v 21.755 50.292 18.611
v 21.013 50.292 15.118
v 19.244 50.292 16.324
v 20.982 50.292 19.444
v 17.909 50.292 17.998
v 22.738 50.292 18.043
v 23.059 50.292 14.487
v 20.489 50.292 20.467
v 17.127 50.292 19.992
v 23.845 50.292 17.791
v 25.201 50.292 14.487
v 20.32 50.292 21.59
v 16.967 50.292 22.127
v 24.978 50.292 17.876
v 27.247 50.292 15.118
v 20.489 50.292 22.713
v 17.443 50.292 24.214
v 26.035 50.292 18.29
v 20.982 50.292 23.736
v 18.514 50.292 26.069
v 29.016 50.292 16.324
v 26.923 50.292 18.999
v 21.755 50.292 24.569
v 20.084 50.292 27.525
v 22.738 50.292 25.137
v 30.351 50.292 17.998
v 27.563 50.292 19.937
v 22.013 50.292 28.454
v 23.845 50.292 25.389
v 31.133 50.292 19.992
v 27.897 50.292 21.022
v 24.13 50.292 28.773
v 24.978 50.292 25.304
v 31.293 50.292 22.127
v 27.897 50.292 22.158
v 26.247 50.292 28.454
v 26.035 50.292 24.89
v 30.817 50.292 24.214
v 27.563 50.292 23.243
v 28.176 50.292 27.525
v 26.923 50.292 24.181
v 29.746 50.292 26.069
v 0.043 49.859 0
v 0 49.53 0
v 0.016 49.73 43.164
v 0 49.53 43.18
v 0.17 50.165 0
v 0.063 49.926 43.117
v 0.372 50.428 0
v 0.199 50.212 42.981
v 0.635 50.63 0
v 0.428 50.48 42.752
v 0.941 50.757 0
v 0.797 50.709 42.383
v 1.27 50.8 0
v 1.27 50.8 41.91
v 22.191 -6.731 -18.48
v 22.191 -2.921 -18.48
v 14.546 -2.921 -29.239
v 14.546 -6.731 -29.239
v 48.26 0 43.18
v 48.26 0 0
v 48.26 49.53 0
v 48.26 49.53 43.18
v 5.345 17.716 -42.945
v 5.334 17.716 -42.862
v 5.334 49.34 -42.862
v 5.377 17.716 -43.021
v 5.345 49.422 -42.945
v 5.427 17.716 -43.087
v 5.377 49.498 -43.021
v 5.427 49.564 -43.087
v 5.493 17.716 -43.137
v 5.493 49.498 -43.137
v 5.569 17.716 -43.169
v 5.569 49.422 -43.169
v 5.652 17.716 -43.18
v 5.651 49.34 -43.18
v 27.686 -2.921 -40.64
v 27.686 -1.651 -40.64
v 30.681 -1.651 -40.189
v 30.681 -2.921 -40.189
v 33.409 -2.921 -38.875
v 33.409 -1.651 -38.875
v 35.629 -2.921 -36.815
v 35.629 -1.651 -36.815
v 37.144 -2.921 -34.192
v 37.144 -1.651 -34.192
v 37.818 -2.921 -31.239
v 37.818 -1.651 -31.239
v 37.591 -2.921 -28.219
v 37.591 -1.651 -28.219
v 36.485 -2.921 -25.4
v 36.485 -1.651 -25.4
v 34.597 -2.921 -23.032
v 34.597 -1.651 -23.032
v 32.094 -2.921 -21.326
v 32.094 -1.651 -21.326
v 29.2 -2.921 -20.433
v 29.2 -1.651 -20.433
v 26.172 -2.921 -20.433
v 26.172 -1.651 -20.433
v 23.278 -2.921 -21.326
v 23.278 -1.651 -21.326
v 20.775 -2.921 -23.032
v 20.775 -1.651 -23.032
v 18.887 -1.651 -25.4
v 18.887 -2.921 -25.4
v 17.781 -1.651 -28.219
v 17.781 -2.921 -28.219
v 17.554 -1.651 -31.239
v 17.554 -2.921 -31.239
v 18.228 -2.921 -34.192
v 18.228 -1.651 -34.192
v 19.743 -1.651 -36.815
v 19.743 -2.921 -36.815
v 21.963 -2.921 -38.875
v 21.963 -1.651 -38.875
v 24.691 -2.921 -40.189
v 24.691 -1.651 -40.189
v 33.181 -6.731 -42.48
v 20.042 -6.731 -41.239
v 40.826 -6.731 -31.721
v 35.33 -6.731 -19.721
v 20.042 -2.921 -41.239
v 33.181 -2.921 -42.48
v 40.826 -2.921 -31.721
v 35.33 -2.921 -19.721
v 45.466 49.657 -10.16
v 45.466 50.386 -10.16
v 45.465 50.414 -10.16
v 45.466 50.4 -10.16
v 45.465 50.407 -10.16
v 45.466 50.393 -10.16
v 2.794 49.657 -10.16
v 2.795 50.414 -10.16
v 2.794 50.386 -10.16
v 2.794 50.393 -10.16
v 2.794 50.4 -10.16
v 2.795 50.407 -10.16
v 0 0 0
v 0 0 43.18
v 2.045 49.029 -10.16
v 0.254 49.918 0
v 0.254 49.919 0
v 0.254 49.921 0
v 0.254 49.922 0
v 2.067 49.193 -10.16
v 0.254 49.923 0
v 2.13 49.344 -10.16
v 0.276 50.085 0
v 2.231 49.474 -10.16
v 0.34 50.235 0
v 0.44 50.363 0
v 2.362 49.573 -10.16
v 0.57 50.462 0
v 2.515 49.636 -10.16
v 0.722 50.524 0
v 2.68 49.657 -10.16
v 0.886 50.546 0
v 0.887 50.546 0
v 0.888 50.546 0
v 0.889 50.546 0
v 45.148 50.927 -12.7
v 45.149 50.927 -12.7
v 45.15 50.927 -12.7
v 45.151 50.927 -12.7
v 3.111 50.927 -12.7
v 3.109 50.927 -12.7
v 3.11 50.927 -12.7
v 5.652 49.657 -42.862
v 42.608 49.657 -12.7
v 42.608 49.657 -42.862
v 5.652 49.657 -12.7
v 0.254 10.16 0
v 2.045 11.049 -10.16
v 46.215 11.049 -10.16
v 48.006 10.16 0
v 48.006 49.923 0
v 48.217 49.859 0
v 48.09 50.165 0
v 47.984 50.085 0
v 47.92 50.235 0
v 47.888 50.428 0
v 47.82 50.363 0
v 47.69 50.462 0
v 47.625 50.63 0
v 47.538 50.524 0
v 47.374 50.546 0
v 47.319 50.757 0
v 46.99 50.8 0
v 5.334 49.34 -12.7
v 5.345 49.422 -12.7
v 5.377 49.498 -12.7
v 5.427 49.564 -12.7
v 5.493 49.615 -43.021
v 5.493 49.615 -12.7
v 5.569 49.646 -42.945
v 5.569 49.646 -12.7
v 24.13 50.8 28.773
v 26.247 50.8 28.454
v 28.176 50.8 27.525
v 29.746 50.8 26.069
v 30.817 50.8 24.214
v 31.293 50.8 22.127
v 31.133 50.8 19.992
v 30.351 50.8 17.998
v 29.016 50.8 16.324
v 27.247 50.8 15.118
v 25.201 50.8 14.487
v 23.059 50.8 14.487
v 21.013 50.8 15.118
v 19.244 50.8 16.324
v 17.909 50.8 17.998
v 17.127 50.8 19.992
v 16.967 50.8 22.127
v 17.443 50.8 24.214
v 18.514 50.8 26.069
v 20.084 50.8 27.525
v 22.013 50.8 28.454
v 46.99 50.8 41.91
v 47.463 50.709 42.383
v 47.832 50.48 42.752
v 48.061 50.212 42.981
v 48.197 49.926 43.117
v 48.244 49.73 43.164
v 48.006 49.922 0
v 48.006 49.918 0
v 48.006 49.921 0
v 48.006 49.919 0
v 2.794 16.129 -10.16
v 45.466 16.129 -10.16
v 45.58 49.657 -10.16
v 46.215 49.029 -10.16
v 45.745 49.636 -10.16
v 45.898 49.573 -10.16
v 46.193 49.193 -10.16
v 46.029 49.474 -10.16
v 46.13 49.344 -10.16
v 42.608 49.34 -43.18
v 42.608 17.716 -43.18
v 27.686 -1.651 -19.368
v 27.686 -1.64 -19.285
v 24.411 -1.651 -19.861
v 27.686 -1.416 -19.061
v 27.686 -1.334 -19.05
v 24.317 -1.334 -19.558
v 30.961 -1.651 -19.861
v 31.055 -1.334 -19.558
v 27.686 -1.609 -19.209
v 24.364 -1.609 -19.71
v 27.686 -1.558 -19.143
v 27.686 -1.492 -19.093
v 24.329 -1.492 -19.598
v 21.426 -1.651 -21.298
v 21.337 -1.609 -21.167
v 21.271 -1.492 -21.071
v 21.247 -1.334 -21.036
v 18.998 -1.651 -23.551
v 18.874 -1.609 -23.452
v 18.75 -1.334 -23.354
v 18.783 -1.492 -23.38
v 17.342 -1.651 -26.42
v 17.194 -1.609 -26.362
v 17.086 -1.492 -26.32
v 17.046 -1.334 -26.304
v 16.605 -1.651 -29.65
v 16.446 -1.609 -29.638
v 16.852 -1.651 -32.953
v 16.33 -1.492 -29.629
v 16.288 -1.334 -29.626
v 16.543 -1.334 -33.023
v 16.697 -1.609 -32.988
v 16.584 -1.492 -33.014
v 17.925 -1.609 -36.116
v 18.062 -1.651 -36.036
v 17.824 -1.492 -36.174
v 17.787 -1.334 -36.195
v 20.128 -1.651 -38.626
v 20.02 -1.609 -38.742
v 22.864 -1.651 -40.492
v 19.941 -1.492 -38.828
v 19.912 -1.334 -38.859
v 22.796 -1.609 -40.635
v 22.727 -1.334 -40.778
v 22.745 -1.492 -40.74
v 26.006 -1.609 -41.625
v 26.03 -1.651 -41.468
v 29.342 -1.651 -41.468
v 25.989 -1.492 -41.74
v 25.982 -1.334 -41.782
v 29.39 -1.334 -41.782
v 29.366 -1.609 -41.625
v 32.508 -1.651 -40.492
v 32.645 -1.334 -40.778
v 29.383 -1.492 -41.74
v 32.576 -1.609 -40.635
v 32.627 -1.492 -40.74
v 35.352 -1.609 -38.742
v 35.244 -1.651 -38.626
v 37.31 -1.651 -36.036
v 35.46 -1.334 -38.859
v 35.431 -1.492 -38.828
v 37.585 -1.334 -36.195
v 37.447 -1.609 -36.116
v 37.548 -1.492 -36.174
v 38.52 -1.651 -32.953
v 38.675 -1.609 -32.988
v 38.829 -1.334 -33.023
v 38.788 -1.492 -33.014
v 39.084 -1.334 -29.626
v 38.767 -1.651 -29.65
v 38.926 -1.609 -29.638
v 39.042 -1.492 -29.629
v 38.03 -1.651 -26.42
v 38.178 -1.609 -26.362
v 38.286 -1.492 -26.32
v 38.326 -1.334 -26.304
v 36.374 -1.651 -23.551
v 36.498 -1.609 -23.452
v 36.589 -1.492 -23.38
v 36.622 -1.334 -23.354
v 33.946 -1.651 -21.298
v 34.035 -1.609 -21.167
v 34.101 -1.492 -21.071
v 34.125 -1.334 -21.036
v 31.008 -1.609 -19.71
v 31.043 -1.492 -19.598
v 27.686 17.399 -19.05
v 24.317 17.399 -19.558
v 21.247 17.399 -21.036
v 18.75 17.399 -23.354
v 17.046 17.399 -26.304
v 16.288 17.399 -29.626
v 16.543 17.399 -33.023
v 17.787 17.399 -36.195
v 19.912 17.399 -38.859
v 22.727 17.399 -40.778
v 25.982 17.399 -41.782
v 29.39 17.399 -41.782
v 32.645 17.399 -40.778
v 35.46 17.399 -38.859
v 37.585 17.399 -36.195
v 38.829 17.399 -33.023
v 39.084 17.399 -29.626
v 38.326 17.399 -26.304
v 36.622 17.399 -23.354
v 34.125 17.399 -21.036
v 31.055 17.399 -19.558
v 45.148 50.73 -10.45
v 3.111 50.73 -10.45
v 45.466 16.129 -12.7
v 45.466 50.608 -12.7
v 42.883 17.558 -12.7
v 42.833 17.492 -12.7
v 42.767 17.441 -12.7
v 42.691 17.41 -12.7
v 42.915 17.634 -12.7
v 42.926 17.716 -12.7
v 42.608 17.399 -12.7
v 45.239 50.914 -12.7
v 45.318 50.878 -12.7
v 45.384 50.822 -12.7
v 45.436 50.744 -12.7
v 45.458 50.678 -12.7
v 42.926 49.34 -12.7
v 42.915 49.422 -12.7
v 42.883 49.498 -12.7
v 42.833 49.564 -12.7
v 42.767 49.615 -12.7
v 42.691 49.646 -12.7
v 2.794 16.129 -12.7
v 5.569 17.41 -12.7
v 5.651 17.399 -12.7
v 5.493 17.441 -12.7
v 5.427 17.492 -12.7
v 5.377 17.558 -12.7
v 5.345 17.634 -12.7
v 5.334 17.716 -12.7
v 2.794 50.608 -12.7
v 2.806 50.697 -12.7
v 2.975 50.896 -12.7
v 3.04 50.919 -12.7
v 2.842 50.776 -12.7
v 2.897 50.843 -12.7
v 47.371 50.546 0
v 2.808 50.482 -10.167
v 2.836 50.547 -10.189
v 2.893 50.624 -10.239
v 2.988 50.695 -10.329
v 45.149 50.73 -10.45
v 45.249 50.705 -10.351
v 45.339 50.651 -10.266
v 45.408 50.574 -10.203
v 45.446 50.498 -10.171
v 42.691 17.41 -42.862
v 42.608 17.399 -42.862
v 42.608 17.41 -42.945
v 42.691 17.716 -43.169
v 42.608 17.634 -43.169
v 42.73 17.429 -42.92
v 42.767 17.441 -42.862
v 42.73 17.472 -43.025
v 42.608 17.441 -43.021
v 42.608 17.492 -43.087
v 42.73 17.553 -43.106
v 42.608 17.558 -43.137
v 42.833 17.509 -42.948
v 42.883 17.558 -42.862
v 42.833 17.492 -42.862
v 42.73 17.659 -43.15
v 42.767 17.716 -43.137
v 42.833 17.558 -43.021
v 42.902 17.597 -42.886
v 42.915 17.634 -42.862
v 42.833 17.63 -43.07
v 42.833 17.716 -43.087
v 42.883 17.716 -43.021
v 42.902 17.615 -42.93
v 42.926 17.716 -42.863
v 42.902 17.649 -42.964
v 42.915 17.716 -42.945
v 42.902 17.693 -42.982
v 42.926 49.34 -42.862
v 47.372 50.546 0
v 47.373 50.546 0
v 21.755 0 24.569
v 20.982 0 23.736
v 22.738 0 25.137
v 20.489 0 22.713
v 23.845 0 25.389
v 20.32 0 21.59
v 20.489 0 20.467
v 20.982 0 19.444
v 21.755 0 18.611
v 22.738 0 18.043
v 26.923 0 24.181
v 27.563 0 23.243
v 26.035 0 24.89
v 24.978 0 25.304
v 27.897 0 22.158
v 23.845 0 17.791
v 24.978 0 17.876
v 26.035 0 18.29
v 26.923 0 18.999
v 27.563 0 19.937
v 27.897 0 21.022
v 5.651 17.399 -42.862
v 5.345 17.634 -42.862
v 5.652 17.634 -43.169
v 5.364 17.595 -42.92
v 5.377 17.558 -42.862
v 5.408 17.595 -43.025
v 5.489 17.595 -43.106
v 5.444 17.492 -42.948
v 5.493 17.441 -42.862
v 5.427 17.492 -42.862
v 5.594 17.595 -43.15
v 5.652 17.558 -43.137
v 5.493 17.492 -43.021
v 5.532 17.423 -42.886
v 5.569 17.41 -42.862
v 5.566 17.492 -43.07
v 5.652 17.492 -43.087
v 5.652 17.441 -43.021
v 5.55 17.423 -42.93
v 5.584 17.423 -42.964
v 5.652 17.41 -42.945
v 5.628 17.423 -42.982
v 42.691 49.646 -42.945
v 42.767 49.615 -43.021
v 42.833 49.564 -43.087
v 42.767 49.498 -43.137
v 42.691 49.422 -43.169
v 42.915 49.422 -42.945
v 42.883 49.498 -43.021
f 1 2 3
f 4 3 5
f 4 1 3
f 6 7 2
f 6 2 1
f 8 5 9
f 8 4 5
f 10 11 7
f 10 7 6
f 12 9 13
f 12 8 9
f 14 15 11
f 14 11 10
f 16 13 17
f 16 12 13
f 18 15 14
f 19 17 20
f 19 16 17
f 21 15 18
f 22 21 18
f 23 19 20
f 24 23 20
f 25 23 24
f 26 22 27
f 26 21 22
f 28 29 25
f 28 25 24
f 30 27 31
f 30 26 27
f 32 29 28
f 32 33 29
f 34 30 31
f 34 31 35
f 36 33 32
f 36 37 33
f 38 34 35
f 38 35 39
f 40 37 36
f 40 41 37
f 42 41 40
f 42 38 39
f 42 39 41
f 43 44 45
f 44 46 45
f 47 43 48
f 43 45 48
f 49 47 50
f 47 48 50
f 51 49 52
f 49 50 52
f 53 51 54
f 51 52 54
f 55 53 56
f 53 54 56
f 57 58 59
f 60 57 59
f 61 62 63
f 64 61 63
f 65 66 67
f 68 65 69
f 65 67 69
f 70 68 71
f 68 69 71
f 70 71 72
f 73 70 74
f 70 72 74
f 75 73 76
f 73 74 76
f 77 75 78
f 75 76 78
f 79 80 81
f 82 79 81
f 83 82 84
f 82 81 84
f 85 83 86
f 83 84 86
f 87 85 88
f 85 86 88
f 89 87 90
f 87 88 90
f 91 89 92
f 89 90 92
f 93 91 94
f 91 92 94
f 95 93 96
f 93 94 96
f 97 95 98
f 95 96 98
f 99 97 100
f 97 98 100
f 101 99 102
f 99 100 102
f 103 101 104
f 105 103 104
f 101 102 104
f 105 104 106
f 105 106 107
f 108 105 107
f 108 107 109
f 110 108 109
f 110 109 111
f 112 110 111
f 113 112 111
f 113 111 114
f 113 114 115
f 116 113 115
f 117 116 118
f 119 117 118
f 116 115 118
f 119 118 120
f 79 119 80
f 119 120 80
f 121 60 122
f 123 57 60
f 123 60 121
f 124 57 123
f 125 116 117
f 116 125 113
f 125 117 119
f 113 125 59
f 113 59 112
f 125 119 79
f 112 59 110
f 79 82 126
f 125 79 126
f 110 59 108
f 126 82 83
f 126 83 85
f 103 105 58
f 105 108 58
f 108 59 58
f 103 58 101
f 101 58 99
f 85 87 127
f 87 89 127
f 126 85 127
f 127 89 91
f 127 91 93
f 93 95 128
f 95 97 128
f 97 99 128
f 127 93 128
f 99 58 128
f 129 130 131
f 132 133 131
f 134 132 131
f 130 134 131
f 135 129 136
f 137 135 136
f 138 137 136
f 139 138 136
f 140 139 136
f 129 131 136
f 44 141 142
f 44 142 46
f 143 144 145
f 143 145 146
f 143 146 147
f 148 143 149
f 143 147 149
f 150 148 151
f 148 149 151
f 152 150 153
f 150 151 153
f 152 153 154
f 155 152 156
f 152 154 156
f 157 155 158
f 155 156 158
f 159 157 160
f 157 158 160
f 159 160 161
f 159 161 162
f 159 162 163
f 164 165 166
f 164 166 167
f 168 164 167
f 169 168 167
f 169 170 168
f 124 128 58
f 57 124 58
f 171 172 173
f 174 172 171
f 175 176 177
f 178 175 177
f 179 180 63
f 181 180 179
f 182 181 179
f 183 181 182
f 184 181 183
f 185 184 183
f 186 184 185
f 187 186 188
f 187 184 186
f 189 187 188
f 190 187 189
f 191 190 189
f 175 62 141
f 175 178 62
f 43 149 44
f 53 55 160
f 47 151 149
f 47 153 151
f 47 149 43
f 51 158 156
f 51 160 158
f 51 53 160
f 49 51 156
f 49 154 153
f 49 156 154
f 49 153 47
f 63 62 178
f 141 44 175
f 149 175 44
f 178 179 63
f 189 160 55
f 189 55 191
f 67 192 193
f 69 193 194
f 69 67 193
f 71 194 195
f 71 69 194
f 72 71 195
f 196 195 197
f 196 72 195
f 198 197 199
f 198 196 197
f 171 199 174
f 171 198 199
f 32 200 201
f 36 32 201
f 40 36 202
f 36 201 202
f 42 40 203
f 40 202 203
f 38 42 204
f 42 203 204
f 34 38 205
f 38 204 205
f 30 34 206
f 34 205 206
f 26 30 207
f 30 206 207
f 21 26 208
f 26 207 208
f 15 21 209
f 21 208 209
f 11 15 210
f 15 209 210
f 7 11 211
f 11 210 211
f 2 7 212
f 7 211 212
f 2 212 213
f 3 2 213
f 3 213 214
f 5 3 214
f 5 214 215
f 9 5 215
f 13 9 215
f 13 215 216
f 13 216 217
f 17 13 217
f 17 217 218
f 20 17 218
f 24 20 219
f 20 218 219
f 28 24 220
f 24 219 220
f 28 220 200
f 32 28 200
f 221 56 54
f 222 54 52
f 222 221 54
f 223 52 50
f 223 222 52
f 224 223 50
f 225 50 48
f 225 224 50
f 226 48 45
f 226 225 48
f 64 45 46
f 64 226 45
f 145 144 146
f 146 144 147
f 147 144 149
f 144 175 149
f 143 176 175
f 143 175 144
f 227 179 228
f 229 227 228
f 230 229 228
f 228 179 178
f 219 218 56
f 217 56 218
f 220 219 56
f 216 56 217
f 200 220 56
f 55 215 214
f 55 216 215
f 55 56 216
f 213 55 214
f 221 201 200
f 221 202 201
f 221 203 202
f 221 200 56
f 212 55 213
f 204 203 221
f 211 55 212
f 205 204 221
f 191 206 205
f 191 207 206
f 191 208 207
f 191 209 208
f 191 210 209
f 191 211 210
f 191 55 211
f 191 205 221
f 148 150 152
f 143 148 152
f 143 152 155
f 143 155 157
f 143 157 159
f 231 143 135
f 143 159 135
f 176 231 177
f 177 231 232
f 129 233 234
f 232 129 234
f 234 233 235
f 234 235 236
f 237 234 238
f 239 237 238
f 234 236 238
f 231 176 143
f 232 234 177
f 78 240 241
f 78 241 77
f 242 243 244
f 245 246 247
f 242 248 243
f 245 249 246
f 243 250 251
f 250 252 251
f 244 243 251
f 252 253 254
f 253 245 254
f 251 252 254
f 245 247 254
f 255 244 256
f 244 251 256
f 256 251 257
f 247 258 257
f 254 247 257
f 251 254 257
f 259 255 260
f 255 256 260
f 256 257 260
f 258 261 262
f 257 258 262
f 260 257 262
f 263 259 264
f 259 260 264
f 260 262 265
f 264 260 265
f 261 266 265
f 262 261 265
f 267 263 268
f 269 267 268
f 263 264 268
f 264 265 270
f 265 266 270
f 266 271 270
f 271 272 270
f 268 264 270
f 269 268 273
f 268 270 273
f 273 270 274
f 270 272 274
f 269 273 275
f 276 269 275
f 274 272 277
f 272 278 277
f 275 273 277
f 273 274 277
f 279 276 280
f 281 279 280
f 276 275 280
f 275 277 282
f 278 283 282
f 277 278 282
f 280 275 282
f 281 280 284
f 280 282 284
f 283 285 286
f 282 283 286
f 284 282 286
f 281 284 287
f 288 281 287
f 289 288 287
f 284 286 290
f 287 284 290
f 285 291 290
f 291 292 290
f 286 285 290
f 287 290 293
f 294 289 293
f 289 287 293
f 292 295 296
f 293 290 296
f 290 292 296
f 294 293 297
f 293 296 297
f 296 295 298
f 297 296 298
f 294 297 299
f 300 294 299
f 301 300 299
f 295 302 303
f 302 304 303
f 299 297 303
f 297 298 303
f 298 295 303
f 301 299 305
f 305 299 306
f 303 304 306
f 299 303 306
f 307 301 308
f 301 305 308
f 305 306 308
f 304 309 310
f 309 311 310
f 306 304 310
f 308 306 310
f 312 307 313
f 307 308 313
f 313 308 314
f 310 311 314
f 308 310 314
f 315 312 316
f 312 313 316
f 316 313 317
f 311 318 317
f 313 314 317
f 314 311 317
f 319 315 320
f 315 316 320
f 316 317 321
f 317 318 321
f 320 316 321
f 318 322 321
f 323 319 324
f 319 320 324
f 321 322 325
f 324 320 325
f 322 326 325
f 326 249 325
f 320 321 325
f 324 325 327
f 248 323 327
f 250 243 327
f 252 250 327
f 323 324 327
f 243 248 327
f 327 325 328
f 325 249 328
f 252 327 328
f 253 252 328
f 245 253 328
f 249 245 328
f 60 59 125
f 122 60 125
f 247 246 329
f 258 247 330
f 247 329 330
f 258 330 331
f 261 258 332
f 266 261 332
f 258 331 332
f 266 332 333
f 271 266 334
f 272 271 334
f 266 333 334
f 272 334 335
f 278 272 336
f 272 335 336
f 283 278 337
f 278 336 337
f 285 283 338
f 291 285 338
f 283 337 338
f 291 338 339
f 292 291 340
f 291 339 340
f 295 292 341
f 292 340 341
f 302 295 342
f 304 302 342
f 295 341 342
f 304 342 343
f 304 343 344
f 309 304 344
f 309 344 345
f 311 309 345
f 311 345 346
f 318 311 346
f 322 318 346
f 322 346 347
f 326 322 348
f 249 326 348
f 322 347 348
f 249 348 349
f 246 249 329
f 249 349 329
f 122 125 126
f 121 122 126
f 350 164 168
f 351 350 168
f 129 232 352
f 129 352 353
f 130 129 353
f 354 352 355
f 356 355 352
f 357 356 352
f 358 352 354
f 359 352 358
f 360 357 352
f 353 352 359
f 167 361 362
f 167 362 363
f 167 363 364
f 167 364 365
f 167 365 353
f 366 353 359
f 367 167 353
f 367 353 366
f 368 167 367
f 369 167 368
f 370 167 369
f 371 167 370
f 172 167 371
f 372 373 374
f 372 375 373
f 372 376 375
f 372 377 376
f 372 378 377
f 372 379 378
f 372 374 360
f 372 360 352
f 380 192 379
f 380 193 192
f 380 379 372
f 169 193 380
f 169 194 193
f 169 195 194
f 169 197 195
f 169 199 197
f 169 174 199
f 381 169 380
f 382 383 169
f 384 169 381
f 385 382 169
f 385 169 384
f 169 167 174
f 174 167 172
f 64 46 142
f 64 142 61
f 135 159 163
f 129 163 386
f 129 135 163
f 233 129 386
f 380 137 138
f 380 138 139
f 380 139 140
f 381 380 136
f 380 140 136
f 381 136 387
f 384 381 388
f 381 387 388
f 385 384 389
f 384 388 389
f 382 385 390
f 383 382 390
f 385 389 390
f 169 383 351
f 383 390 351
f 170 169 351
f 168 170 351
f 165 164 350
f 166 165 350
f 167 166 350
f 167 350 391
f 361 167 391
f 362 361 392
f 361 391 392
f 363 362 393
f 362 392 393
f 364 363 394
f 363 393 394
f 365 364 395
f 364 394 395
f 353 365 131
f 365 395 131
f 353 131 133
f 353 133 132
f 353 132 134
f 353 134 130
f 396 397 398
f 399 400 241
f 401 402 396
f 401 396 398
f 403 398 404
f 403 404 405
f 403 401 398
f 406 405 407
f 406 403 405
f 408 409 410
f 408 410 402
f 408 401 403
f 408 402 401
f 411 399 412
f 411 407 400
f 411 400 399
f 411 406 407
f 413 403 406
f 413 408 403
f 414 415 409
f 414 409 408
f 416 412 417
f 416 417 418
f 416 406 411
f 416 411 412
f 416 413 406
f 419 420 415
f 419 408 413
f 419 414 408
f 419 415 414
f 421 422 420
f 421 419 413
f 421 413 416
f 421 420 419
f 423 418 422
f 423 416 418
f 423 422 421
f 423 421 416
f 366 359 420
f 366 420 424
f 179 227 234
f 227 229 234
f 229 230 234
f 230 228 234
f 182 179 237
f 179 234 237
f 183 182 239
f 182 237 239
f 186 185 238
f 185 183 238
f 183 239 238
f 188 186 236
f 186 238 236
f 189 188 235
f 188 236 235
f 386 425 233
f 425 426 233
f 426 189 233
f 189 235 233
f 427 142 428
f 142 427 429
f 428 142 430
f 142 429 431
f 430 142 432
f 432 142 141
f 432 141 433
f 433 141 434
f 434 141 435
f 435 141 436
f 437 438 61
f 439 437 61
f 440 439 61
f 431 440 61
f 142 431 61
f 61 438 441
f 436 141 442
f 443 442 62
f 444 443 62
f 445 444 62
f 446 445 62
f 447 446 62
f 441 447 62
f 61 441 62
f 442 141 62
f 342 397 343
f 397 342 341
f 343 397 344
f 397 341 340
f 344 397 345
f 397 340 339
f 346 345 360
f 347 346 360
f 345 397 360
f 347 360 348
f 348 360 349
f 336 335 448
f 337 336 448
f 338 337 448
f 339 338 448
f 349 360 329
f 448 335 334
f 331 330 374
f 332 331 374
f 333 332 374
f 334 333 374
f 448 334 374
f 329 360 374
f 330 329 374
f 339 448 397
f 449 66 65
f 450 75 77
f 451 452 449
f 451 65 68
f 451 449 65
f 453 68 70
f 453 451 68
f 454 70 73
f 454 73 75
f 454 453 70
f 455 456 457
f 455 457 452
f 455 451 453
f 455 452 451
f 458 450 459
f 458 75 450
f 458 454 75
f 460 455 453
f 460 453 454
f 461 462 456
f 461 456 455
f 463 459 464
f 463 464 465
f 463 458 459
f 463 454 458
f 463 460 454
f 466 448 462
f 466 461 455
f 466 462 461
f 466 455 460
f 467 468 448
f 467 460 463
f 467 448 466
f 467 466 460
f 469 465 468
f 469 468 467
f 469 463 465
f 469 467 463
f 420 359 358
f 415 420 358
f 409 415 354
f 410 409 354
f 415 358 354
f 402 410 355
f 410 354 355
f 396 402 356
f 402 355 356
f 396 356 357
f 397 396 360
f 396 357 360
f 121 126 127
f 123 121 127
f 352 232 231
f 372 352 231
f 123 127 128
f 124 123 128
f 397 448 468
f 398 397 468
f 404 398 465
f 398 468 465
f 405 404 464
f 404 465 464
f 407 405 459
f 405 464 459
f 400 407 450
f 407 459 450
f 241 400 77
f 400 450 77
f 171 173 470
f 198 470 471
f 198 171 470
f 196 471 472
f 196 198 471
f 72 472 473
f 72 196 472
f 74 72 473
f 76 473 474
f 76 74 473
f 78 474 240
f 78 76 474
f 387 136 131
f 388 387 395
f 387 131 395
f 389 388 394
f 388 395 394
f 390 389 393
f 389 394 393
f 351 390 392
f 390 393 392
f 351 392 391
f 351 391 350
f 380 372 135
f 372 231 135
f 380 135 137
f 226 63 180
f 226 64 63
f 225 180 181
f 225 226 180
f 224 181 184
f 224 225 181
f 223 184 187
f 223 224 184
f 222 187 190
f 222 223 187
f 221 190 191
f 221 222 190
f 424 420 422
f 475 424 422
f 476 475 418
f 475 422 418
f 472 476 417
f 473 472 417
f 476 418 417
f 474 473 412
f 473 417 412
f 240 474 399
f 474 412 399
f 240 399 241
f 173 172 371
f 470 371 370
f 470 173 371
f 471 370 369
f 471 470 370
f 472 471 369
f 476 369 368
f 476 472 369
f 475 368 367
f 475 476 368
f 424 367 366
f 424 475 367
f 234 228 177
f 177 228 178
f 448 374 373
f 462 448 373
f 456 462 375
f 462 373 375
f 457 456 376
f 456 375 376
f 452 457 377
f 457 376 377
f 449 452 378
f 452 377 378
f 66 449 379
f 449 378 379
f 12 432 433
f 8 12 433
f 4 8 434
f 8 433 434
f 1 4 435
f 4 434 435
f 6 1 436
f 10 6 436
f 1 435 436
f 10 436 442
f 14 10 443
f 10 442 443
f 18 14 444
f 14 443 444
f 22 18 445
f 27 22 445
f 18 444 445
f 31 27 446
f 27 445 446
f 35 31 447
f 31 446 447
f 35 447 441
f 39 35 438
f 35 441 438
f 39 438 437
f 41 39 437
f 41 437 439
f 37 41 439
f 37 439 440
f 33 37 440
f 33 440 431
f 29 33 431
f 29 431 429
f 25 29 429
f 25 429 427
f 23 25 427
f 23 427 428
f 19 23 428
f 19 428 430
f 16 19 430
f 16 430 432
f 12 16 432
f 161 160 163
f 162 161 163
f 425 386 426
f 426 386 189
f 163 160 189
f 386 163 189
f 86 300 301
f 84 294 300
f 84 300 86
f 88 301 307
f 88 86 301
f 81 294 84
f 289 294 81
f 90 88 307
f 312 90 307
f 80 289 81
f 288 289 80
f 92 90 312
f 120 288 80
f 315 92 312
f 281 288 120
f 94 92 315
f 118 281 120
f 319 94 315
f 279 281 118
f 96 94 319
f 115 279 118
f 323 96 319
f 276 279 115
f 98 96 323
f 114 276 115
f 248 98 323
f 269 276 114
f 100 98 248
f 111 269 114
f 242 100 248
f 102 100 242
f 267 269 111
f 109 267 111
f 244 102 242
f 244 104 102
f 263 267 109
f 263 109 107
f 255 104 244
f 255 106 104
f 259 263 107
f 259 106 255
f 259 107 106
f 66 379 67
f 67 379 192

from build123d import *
from OCP.BRepFilletAPI import BRepFilletAPI_MakeChamfer

# Parameters (mm, degrees)
SKETCH2_W                   = 48.26
SKETCH2_H                   = 50.8
BOSS_EXTRUDE1_DEPTH         = 43.18
FILLET1_R                   = 1.27
BOSS_EXTRUDE2_DEPTH         = 10.16
CHAMFER1_SIZE               = 10.16
CHAMFER1_SIZE_2             = 0.888884821
SKETCH4_R                   = 7.183192936
CUT_EXTRUDE1_DEPTH          = 0.508
CHAMFER4_SIZE               = 1.791482124
CHAMFER4_SIZE_2             = 10.16
SKETCH6_W                   = 42.672
SKETCH6_H                   = 34.798230358
BOSS_EXTRUDE3_DEPTH         = 2.54
CHAMFER2_SIZE2              = 2.54
CHAMFER2_SIZE               = 0.222221205
FILLET4_R                   = 0.3175
SKETCH8_W                   = 37.592
SKETCH8_H                   = 32.258230358
BOSS_EXTRUDE4_DEPTH         = 30.48
FILLET5_R                   = 0.3175
FILLET6_R                   = 0.3175
FILLET7_R                   = 0.3175
SKETCH10_R                  = 11.43
BOSS_EXTRUDE5_DEPTH         = 19.05
SKETCH11_R                  = 10.16
BOSS_EXTRUDE6_DEPTH         = 1.27
BOSS_EXTRUDE7_DEPTH         = 3.81
FILLET8_R                   = 0.3175
FILLET2_R                   = 0.635
F_3_64_0_3_DIAMETER_HOLE1_D = 7.62


# Some blends are built 0.0001 mm under size
with BuildPart() as part:
    # Sketch2 → Boss-Extrude1 (new body)
    with BuildSketch(Plane.XY):
        with Locations((24.13, 25.4)):
            Rectangle(SKETCH2_W, SKETCH2_H)
    extrude(amount=BOSS_EXTRUDE1_DEPTH)

    # Fillet1
    fillet1_edges = [part.edges().sort_by_distance(p)[0] for p in [
        (24.13, 50.8, 43.18),
        (0, 50.8, 21.59),
        (48.26, 50.8, 21.59),
    ]]
    fillet(fillet1_edges, radius=FILLET1_R)

    # Sketch3 → Boss-Extrude2 (add)
    with BuildSketch(Plane(origin=(0, 0, 0), x_dir=(-1, 0, 0), z_dir=(0, 0, -1))):
        Polygon((-45.466, 50.546), (-2.794, 50.546), (-0.254, 50.546), (-0.254, 48.006), (-0.254, 10.16), (-48.006, 10.16), (-48.006, 48.006), (-48.006, 50.546), align=None)
    extrude(amount=BOSS_EXTRUDE2_DEPTH)

    # Chamfer1
    chamfer1_edges_1 = [part.edges().sort_by_distance(p)[0] for p in [
        (24.13, 50.546, -10.16),
    ]]
    chamfer1_side_1 = [part.faces().sort_by_distance(p)[0] for p in [
        (24.13, 50.546, -10.142222304),
    ]]
    chamfer1_edges_2 = [part.edges().sort_by_distance(p)[0] for p in [
        (24.13, 10.16, -10.16),
    ]]
    chamfer1_side_2 = [part.faces().sort_by_distance(p)[0] for p in [
        (24.13, 10.16, -10.142222304),
    ]]
    chamfer1 = BRepFilletAPI_MakeChamfer(part.part.solid().wrapped)
    for e in chamfer1_edges_1:
        chamfer1.Add(CHAMFER1_SIZE - 0.0001, CHAMFER1_SIZE_2 - 0.0001, e.wrapped, chamfer1_side_1[0].wrapped)
    for e in chamfer1_edges_2:
        chamfer1.Add(CHAMFER1_SIZE - 0.0001, CHAMFER1_SIZE_2 - 0.0001, e.wrapped, chamfer1_side_2[0].wrapped)
    add(Compound.cast(chamfer1.Shape()), mode=Mode.REPLACE)  # a hair under: the kernel refuses the full size

    # Sketch4 → Cut-Extrude1 (cut)
    with BuildSketch(Plane(origin=(0, 50.8, 0), x_dir=(1, 0, 0), z_dir=(0, 1, 0))):
        with Locations(Location((24.13, -21.59, 0), (0, 0, 270))):
            Circle(SKETCH4_R)
    extrude(amount=-CUT_EXTRUDE1_DEPTH, mode=Mode.SUBTRACT)

    # Chamfer4
    chamfer4_edges_1 = [part.edges().sort_by_distance(p)[0] for p in [
        (48.006, 30.353, -10.16),
    ]]
    chamfer4_side_1 = [part.faces().sort_by_distance(p)[0] for p in [
        (47.970170358, 30.353, -10.16),
    ]]
    chamfer4_edges_2 = [part.edges().sort_by_distance(p)[0] for p in [
        (0.254, 30.353, -10.16),
    ]]
    chamfer4_side_2 = [part.faces().sort_by_distance(p)[0] for p in [
        (0.254, 30.353, -10.124170358),
    ]]
    chamfer4 = BRepFilletAPI_MakeChamfer(part.part.solid().wrapped)
    for e in chamfer4_edges_1:
        chamfer4.Add(CHAMFER4_SIZE - 0.0001, CHAMFER4_SIZE_2 - 0.0001, e.wrapped, chamfer4_side_1[0].wrapped)
    for e in chamfer4_edges_2:
        chamfer4.Add(CHAMFER4_SIZE_2 - 0.0001, CHAMFER4_SIZE - 0.0001, e.wrapped, chamfer4_side_2[0].wrapped)
    add(Compound.cast(chamfer4.Shape()), mode=Mode.REPLACE)  # a hair under: the kernel refuses the full size

    # Sketch6 → Boss-Extrude3 (add)
    with BuildSketch(Plane(origin=(0, 0, -10.16), x_dir=(-1, 0, 0), z_dir=(0, 0, -1))):
        with Locations((-24.13, 33.528)):
            Rectangle(SKETCH6_W, SKETCH6_H)
    extrude(amount=BOSS_EXTRUDE3_DEPTH)

    # Chamfer2
    chamfer2_edges = [part.edges().sort_by_distance(p)[0] for p in [
        (24.13, 50.927115179, -10.16),
    ]]
    chamfer2_side = [part.faces().sort_by_distance(p)[0] for p in [
        (24.13, 50.922670754, -10.16),
    ]]
    chamfer(chamfer2_edges, length=CHAMFER2_SIZE - 0.0001, length2=CHAMFER2_SIZE2 - 0.0001, reference=chamfer2_side[0])  # a hair under: the kernel refuses the full size

    # Fillet4
    # the kernel refuses this fillet: 0.3175 mm, written as the material it takes off along each edge
    with BuildSketch(Plane(origin=(45.466, 50.635842296, -9.369267992), x_dir=(-1, 0, 0), z_dir=(0, 0.08712022396653547, -0.9961978049443899)), Plane(origin=(2.794, 50.635842296, -9.369267992), x_dir=(0, -0.9961978049443899, -0.08712022396653547), z_dir=(0, 0.08712022396653547, -0.9961978049443899))) as fillet4_piece_1:
        with BuildLine():
            CenterArc((FILLET4_R, -FILLET4_R), FILLET4_R, 90, 90)
            Line((0, -FILLET4_R), (0, 0))
            Line((0, 0), (FILLET4_R, 0))
        make_face()
    extrude(amount=4.137094054, mode=Mode.SUBTRACT)
    with BuildSketch(Plane(origin=(46.193363902, 50.704993974, -10.16), x_dir=(0, -1, 0), z_dir=(-1, 0, 0))) as fillet4_piece_2:
        with BuildLine():
            CenterArc((FILLET4_R * 0.916363970592, -FILLET4_R), FILLET4_R, 90, 85.002042847)
            Line((-FILLET4_R * 0.0798338343528, -FILLET4_R * 0.912879776033), (0, 0))
            Line((0, 0), (FILLET4_R * 0.916363970592, 0))
        make_face()
    extrude(amount=44.126727803, mode=Mode.SUBTRACT)

    # Sketch8 → Boss-Extrude4 (add)
    with BuildSketch(Plane(origin=(0, 0, -12.7), x_dir=(-1, 0, 0), z_dir=(0, 0, -1))):
        with Locations((-24.13, 33.528)):
            Rectangle(SKETCH8_W, SKETCH8_H)
    extrude(amount=BOSS_EXTRUDE4_DEPTH)

    # Fillet5
    fillet5_edges = [part.edges().sort_by_distance(p)[0] for p in [
        (42.926, 49.657115179, -27.94),
        (5.334, 49.657115179, -27.94),
        (24.13, 49.657115179, -43.18),
    ]]
    fillet(fillet5_edges, radius=FILLET5_R)

    # Fillet6
    # the kernel refuses this fillet: 0.3175 mm, written as the material it takes off along each edge
    with BuildSketch(Plane(origin=(42.6085, 17.716384821, -42.8625), x_dir=(0, -1, 0), z_dir=(1, 0, 0))) as fillet6_piece_1_section:
        Polygon((0, 0), (FILLET6_R * 1.02, 0), (FILLET6_R * 1.02, FILLET6_R * 1.02), (0, FILLET6_R * 1.02), align=None)
    fillet6_piece_1 = extrude(amount=FILLET6_R * 1.02, mode=Mode.PRIVATE)
    fillet6_piece_1 = fillet6_piece_1 - Plane(origin=(42.6085, 17.716384821, -42.8625), x_dir=(0, 0.7071067811865475, 0.7071067811865475), z_dir=(1, 0, 0)) * Sphere(FILLET6_R, mode=Mode.PRIVATE)
    add(fillet6_piece_1, mode=Mode.SUBTRACT)
    with BuildSketch(Plane(origin=(42.926, 17.398884821, -12.7), x_dir=(0, 1, 0), z_dir=(0, 0, -1))) as fillet6_piece_2:
        with BuildLine():
            CenterArc((FILLET6_R, -FILLET6_R), FILLET6_R, 90, 90)
            Line((0, -FILLET6_R), (0, 0))
            Line((0, 0), (FILLET6_R, 0))
        make_face()
    extrude(amount=30.1625, mode=Mode.SUBTRACT)
    with BuildSketch(Plane(origin=(4.54025, 17.398884821, -43.18), x_dir=(0, 0, 1), z_dir=(1, 0, 0))) as fillet6_piece_3:
        with BuildLine():
            CenterArc((FILLET6_R, -FILLET6_R), FILLET6_R, 90, 90)
            Line((0, -FILLET6_R), (0, 0))
            Line((0, 0), (FILLET6_R, 0))
        make_face()
    extrude(amount=38.06825, mode=Mode.SUBTRACT)
    with BuildSketch(Plane(origin=(5.334, 50.133365179, -43.18), x_dir=(0, 0, 1), z_dir=(0, -1, 0))) as fillet6_piece_4:
        with BuildLine():
            CenterArc((FILLET6_R, -FILLET6_R), FILLET6_R, 90, 90)
            Line((0, -FILLET6_R), (0, 0))
            Line((0, 0), (FILLET6_R, 0))
        make_face()
    extrude(amount=33.528230357, mode=Mode.SUBTRACT)
    with BuildSketch(Plane(origin=(42.926, 17.716384821, -43.18), x_dir=(0, 0, 1), z_dir=(0, 1, 0))) as fillet6_piece_5:
        with BuildLine():
            CenterArc((FILLET6_R, -FILLET6_R), FILLET6_R, 90, 90)
            Line((0, -FILLET6_R), (0, 0))
            Line((0, 0), (FILLET6_R, 0))
        make_face()
    extrude(amount=32.416980357, mode=Mode.SUBTRACT)

    # Fillet7
    # the kernel refuses this fillet: 0.3175 mm, written as the material it takes off along each edge
    with BuildSketch(Plane(origin=(5.6515, 17.716384821, -42.8625), x_dir=(-1, 0, 0), z_dir=(0, -1, 0))) as fillet7_piece_1_section:
        Polygon((0, 0), (FILLET7_R, 0), (FILLET7_R, FILLET7_R), (0, FILLET7_R), align=None)
    fillet7_piece_1 = extrude(amount=FILLET7_R, mode=Mode.PRIVATE)
    fillet7_piece_1 = fillet7_piece_1 - Plane(origin=(5.6515, 17.716384821, -42.8625), x_dir=(0.7071067811865475, 0, 0.7071067811865475), z_dir=(0, -1, 0)) * Sphere(FILLET7_R, mode=Mode.PRIVATE)
    add(fillet7_piece_1, mode=Mode.SUBTRACT)
    with BuildSketch(Plane(origin=(5.334, 17.398884821, -12.7), x_dir=(1, 0, 0), z_dir=(0, 0, -1))) as fillet7_piece_2:
        with BuildLine():
            CenterArc((FILLET7_R, -FILLET7_R), FILLET7_R, 90, 90)
            Line((0, -FILLET7_R), (0, 0))
            Line((0, 0), (FILLET7_R, 0))
        make_face()
    extrude(amount=30.1625, mode=Mode.SUBTRACT)

    # Sketch10 → Boss-Extrude5 (add)
    with BuildSketch(Plane.XZ.offset(-17.398884821)):
        with Locations(Location((27.686, -30.48, 0), (0, 0, 90))):
            Circle(SKETCH10_R)
    extrude(amount=BOSS_EXTRUDE5_DEPTH)

    # Sketch11 → Boss-Extrude6 (add)
    with BuildSketch(Plane.XZ.offset(1.651115179)):
        with Locations(Location((27.686, -30.48, 0), (0, 0, 270))):
            Circle(SKETCH11_R)
    extrude(amount=BOSS_EXTRUDE6_DEPTH)

    # Sketch12 → Boss-Extrude7 (add)
    with BuildSketch(Plane.XZ.offset(2.921115179)):
        Polygon((33.181274645, -42.479798189), (40.825767394, -31.720851652), (35.33049275, -19.721053462), (22.190725355, -18.480201811), (14.546232606, -29.239148348), (20.04150725, -41.238946538), align=None)
    extrude(amount=BOSS_EXTRUDE7_DEPTH)

    # Fillet8
    fillet8_edges = [part.edges().sort_by_distance(p)[0] for p in [
        (27.686, -1.651115179, -41.91),
    ]]
    fillet(fillet8_edges, radius=FILLET8_R)

    # Fillet2
    # the kernel refuses this fillet: 0.635 mm, written as the material it takes off along each edge
    with BuildSketch(Plane(origin=(45.944105867, 49.523002068, -11.694220381), x_dir=(0.01490405395374314, -0.9963095509323676, 0.08452897666887954), z_dir=(0.17299962328390456, 0.08583285338927087, 0.9811747304240377))) as fillet2_piece_1_section:
        with BuildLine():
            CenterArc((FILLET2_R * 0.984980559667, -FILLET2_R), FILLET2_R, 90, 89.132954612)
            Line((-FILLET2_R * 0.0149049417488, -FILLET2_R * 0.984867780788), (0, 0))
            Line((0, 0), (FILLET2_R * 0.984980559667, 0))
        make_face()
    fillet2_piece_1 = extrude(amount=13.48214579, mode=Mode.PRIVATE)
    fillet2_piece_1 = split(fillet2_piece_1, bisect_by=Plane(origin=(46.959597239, 49.956662585, -10.16), z_dir=(0, 0, 1)), keep=Keep.TOP, mode=Mode.PRIVATE)
    fillet2_piece_1 = split(fillet2_piece_1, bisect_by=Plane(origin=(46.959597239, 49.956662585, 0), z_dir=(0, 0, -1)), keep=Keep.TOP, mode=Mode.PRIVATE)
    add(fillet2_piece_1, mode=Mode.SUBTRACT)
    with BuildSketch(Plane(origin=(-0.016512009, 50.680213111, 1.534120381), x_dir=(-0.014904053953745064, -0.9963095509323676, 0.0845289766688792), z_dir=(0.17299962328390434, -0.08583285338927088, -0.9811747304240378))) as fillet2_piece_2_section:
        with BuildLine():
            CenterArc((FILLET2_R * 0.984980559667, -FILLET2_R), FILLET2_R, 90, 89.132954612)
            Line((-FILLET2_R * 0.0149049417488, -FILLET2_R * 0.984867780788), (0, 0))
            Line((0, 0), (FILLET2_R * 0.984980559667, 0))
        make_face()
    fillet2_piece_2 = extrude(amount=13.48214579, mode=Mode.PRIVATE)
    fillet2_piece_2 = split(fillet2_piece_2, bisect_by=Plane(origin=(0.354174002, 50.466816982, -10.16), z_dir=(0, 0, 1)), keep=Keep.TOP, mode=Mode.PRIVATE)
    fillet2_piece_2 = split(fillet2_piece_2, bisect_by=Plane(origin=(0.354174002, 50.466816982, 0), z_dir=(0, 0, -1)), keep=Keep.TOP, mode=Mode.PRIVATE)
    add(fillet2_piece_2, mode=Mode.SUBTRACT)

    # 3/64 (0.3) Diameter Hole1 (through all)
    with Locations(Plane(origin=(0, 50.292, 0), x_dir=(1, 0, 0), z_dir=(0, 1, 0))):
        with Locations((24.13, -21.59)):
            Hole(F_3_64_0_3_DIAMETER_HOLE1_D / 2)


solid = part.part
